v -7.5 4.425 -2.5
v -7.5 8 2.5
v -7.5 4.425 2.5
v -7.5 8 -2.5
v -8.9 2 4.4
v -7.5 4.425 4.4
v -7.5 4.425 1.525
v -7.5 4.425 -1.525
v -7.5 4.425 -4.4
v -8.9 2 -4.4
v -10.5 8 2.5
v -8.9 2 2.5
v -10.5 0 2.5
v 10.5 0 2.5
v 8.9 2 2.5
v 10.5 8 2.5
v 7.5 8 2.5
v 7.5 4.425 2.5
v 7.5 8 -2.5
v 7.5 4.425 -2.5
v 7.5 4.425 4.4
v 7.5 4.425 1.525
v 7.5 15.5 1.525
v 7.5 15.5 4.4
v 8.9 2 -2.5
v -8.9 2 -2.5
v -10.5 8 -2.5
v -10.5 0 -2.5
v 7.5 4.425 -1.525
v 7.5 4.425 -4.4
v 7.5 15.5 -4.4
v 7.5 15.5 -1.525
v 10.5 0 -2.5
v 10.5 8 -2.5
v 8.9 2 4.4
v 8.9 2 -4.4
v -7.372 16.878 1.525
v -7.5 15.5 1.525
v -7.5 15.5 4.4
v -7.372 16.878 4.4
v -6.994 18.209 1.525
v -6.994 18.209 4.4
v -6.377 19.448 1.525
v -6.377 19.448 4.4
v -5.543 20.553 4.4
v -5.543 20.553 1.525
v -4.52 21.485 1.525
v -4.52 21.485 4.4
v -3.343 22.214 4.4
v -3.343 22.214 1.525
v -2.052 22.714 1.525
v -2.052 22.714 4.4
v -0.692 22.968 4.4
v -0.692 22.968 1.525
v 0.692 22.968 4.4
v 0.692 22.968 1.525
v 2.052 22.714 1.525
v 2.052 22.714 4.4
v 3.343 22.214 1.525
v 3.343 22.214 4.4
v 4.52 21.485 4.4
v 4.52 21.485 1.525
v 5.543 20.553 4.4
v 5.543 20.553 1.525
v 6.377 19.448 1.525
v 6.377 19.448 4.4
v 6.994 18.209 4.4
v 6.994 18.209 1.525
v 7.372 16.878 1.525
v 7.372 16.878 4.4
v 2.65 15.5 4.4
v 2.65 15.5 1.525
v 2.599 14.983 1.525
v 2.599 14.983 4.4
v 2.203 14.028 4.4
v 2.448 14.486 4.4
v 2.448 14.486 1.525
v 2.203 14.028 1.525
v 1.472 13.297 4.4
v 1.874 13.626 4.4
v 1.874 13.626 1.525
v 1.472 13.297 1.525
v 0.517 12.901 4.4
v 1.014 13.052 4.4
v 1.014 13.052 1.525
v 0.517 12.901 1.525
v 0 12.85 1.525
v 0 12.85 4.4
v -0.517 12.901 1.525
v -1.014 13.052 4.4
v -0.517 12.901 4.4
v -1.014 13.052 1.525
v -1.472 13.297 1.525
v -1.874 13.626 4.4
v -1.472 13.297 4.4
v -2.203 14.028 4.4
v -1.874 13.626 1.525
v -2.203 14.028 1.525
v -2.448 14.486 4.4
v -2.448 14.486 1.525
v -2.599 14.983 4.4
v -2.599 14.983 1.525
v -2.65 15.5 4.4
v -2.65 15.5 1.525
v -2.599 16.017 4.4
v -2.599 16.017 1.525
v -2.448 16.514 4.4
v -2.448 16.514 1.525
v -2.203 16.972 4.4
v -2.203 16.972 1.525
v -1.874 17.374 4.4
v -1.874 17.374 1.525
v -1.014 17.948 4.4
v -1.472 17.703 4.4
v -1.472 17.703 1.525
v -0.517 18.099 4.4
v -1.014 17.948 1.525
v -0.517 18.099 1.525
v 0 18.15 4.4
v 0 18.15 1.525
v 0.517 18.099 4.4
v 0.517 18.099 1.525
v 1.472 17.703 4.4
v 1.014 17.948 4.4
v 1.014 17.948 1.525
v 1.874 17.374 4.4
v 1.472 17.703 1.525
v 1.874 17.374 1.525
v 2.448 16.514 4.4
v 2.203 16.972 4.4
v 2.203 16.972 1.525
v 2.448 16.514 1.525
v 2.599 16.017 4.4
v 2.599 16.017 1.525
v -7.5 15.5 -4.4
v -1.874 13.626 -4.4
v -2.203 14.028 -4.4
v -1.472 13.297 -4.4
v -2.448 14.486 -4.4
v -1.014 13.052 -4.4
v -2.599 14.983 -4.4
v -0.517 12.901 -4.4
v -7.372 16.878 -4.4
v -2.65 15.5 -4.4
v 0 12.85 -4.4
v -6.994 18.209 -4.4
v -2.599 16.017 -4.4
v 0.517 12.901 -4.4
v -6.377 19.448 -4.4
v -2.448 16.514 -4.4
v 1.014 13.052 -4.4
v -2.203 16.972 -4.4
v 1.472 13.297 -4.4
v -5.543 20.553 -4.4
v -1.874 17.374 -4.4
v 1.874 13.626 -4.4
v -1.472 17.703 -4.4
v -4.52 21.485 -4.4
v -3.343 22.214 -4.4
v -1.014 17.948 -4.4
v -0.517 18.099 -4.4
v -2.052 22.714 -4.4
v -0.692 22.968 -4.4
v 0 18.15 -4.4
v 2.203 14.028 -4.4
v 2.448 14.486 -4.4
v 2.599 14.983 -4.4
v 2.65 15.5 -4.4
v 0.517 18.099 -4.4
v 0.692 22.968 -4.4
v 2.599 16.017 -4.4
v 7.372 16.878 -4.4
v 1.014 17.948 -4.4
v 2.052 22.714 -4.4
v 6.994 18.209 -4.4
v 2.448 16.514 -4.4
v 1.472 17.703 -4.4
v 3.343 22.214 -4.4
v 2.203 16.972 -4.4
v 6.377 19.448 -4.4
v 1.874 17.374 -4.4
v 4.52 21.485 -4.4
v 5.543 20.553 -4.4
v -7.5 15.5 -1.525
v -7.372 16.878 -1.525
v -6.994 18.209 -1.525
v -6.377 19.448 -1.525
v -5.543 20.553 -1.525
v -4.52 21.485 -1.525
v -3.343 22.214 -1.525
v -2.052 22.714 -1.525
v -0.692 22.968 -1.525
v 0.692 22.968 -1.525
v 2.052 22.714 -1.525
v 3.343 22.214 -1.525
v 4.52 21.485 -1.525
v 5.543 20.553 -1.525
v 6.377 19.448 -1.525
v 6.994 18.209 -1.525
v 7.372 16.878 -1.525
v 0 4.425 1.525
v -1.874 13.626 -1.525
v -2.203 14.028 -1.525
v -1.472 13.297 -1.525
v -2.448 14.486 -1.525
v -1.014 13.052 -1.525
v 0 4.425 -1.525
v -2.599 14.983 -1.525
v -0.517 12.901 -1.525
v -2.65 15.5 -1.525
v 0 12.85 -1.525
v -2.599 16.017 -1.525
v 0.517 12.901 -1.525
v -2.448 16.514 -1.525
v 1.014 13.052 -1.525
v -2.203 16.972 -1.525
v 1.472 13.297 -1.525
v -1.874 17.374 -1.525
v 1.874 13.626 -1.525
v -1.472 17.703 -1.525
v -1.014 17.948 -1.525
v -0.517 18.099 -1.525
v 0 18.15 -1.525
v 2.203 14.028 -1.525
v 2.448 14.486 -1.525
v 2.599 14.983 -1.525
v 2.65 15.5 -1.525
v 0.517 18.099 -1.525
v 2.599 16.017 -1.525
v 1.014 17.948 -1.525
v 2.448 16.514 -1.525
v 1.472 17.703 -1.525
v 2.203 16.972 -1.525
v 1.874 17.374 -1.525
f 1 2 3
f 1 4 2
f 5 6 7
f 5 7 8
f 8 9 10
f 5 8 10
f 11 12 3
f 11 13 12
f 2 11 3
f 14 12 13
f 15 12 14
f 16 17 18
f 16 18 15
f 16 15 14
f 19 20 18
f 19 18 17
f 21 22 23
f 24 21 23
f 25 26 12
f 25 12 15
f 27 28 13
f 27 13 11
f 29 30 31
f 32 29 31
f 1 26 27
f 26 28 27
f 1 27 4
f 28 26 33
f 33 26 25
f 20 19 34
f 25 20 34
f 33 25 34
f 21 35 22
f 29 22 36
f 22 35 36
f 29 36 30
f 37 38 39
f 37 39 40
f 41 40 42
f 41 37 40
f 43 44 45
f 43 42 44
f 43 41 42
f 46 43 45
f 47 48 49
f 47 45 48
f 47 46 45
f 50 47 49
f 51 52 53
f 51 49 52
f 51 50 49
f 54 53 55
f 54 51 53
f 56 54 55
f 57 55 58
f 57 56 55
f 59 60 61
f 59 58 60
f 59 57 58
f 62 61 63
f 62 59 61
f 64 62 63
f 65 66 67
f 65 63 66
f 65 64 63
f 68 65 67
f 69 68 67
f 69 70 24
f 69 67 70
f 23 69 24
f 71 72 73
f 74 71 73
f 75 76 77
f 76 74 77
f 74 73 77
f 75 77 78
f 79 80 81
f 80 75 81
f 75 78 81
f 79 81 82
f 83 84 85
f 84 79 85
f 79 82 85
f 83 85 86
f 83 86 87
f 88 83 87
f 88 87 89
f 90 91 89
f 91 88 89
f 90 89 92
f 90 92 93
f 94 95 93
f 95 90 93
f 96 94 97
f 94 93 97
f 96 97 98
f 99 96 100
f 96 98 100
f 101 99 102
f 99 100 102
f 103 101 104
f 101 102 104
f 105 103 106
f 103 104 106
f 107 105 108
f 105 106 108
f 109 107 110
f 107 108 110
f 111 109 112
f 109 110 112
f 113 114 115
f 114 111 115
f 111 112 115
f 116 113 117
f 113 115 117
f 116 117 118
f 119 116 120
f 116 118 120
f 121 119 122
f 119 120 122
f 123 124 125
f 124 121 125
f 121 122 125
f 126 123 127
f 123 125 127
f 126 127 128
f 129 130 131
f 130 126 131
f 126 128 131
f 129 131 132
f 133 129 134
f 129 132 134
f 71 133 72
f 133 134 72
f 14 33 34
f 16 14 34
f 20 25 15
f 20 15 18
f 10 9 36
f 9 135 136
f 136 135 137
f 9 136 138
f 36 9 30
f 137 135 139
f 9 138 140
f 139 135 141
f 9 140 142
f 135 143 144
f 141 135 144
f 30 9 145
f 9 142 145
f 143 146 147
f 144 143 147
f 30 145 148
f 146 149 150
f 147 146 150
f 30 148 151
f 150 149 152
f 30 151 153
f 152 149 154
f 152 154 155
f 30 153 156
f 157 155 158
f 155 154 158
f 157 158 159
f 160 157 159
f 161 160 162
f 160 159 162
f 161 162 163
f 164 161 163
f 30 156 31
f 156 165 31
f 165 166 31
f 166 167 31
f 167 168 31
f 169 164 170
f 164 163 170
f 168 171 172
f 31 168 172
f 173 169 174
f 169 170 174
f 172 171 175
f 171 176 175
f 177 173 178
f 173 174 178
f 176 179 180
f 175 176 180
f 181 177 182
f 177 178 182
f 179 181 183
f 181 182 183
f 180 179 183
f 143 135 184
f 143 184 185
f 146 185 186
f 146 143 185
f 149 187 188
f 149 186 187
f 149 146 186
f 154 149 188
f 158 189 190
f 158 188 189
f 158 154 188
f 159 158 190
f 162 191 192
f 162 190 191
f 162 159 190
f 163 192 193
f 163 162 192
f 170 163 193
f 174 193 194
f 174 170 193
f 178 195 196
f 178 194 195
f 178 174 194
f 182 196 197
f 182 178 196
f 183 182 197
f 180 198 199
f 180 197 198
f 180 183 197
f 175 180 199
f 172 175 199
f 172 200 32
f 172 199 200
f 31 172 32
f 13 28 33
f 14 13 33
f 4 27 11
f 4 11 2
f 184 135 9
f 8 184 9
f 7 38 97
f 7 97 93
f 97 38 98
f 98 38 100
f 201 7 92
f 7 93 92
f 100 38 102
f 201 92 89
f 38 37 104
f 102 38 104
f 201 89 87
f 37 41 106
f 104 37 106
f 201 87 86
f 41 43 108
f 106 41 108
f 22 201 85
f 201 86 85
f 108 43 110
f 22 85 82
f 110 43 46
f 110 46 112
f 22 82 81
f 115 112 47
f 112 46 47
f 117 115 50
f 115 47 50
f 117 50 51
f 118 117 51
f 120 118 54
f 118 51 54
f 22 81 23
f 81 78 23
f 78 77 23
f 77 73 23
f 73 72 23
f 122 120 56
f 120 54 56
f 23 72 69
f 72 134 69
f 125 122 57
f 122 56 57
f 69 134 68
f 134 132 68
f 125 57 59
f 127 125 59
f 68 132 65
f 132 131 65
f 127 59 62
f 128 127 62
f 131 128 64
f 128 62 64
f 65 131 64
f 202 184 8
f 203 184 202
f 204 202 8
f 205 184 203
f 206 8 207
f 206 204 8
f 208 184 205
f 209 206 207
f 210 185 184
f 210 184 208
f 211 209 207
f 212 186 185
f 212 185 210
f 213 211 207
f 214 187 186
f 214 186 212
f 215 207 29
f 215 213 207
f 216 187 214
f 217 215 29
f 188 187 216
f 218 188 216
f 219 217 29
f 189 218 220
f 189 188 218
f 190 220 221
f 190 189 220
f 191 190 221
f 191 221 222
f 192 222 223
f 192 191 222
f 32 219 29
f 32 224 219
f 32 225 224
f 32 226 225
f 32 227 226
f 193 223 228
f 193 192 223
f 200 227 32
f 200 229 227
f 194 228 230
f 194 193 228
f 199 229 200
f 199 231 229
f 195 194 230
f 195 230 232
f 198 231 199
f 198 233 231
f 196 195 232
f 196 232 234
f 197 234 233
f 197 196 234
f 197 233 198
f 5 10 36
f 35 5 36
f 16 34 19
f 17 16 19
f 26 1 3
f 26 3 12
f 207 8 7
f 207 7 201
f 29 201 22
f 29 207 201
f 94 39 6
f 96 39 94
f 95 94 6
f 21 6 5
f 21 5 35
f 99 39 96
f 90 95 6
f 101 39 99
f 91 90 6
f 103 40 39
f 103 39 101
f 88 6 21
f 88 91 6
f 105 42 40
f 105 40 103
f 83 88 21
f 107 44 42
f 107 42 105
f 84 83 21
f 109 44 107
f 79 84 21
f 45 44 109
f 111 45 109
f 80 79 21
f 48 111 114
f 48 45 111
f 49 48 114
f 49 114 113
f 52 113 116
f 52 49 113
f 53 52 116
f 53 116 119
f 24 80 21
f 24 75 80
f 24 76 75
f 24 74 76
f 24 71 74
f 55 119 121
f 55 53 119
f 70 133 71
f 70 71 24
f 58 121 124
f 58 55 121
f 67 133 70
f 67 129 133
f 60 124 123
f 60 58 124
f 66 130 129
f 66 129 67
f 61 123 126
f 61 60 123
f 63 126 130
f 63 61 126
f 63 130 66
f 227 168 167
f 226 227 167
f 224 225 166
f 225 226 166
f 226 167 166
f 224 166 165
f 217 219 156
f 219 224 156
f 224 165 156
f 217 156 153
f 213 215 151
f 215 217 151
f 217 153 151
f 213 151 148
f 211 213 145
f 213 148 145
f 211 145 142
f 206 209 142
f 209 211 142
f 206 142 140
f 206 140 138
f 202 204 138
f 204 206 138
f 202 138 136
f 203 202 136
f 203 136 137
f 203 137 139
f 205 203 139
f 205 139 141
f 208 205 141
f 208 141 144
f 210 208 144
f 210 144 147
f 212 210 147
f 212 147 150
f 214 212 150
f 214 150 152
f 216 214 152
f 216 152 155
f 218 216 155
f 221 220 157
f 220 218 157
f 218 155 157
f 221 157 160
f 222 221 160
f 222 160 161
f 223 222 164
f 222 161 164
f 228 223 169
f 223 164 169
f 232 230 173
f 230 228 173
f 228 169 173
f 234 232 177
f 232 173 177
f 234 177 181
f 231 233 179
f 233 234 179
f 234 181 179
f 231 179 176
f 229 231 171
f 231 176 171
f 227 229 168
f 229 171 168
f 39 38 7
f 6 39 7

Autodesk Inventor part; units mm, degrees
ref_plane "YZ Plane" through (0, 0, 0) normal (1, 0, 0) x (0, 1, 0)
ref_plane "XZ Plane" through (0, 0, 0) normal (0, 1, 0) x (-1, 0, 0)
ref_plane "XY Plane" through (0, 0, 0) normal (0, 0, 1) x (1, 0, 0)
sketch "草圖1" plane through (0, 0, 0) normal (0, 0, 1) x (1, 0, 0)
  line L0 (0, 14.1483) -> (0, -10.3645)
  line L1 (0, 0) -> (-10.5, 0)
  line L2 (-10.5, 0) -> (-10.5, 8)
  line L3 (-10.5, 8) -> (-7.5, 8)
  line L4 (0, 0) -> (10.5, 0)
  line L5 (10.5, 0) -> (10.5, 8)
  line L6 (10.5, 8) -> (7.5, 8)
  circle A0 centre (0, 15.5) radius 2.65
  circle A1 centre (0, 15.5) radius 7.5 construction
  line L7 (-7.5, 4.4249) -> (-8.9, 2)
  line L8 (-8.9, 2) -> (0.3304, 2)
  line L9 (0.3304, 2) -> (8.9, 2)
  line L10 (8.9, 2) -> (7.5, 4.4249)
  line L11 (7.5, 4.4249) -> (7.5, 8.209)
  line L12 (-7.5, 8.147) -> (-7.5, 4.4249)
  line L13 (-7.5, 8.147) -> (-7.5, 15.5)
  line L14 (7.5, 8.209) -> (7.5, 15.5)
  arc A2 (7.5, 15.5) -> (-7.5, 15.5) centre (0, 15.5) ccw
  line L15 (-7.5, 4.4249) -> (7.5, 4.4249)
  point P0 (0, 2)
  dimension "d4" = 8
  dimension "d5" = 3
  dimension "d7" = 5.3
  dimension "d14" = 15
  dimension "d19" = 60
  dimension "d20" = 1.6
  dimension "d21" = 2
  dimension "d22" = 60
extrude "擠出1" add sketch "草圖1" along normal mid plane 5 contours L8 L9 L10 L11 L6 L5 L4 L0 | L0 L1 L2 L3 L12 L7 L8
extrude "擠出2" add sketch "草圖1" along normal mid plane 8.8 separate body contours L15 L12 L13 A2 L14 L11 | L15 L10 L9 L8 L0 | L0 L8 L7 L15
extrude "擠出3" cut sketch "草圖1" along normal mid plane 3.05 contours L15 L12 L13 A2 L14 L11 bodies 2
properties part number "base"
